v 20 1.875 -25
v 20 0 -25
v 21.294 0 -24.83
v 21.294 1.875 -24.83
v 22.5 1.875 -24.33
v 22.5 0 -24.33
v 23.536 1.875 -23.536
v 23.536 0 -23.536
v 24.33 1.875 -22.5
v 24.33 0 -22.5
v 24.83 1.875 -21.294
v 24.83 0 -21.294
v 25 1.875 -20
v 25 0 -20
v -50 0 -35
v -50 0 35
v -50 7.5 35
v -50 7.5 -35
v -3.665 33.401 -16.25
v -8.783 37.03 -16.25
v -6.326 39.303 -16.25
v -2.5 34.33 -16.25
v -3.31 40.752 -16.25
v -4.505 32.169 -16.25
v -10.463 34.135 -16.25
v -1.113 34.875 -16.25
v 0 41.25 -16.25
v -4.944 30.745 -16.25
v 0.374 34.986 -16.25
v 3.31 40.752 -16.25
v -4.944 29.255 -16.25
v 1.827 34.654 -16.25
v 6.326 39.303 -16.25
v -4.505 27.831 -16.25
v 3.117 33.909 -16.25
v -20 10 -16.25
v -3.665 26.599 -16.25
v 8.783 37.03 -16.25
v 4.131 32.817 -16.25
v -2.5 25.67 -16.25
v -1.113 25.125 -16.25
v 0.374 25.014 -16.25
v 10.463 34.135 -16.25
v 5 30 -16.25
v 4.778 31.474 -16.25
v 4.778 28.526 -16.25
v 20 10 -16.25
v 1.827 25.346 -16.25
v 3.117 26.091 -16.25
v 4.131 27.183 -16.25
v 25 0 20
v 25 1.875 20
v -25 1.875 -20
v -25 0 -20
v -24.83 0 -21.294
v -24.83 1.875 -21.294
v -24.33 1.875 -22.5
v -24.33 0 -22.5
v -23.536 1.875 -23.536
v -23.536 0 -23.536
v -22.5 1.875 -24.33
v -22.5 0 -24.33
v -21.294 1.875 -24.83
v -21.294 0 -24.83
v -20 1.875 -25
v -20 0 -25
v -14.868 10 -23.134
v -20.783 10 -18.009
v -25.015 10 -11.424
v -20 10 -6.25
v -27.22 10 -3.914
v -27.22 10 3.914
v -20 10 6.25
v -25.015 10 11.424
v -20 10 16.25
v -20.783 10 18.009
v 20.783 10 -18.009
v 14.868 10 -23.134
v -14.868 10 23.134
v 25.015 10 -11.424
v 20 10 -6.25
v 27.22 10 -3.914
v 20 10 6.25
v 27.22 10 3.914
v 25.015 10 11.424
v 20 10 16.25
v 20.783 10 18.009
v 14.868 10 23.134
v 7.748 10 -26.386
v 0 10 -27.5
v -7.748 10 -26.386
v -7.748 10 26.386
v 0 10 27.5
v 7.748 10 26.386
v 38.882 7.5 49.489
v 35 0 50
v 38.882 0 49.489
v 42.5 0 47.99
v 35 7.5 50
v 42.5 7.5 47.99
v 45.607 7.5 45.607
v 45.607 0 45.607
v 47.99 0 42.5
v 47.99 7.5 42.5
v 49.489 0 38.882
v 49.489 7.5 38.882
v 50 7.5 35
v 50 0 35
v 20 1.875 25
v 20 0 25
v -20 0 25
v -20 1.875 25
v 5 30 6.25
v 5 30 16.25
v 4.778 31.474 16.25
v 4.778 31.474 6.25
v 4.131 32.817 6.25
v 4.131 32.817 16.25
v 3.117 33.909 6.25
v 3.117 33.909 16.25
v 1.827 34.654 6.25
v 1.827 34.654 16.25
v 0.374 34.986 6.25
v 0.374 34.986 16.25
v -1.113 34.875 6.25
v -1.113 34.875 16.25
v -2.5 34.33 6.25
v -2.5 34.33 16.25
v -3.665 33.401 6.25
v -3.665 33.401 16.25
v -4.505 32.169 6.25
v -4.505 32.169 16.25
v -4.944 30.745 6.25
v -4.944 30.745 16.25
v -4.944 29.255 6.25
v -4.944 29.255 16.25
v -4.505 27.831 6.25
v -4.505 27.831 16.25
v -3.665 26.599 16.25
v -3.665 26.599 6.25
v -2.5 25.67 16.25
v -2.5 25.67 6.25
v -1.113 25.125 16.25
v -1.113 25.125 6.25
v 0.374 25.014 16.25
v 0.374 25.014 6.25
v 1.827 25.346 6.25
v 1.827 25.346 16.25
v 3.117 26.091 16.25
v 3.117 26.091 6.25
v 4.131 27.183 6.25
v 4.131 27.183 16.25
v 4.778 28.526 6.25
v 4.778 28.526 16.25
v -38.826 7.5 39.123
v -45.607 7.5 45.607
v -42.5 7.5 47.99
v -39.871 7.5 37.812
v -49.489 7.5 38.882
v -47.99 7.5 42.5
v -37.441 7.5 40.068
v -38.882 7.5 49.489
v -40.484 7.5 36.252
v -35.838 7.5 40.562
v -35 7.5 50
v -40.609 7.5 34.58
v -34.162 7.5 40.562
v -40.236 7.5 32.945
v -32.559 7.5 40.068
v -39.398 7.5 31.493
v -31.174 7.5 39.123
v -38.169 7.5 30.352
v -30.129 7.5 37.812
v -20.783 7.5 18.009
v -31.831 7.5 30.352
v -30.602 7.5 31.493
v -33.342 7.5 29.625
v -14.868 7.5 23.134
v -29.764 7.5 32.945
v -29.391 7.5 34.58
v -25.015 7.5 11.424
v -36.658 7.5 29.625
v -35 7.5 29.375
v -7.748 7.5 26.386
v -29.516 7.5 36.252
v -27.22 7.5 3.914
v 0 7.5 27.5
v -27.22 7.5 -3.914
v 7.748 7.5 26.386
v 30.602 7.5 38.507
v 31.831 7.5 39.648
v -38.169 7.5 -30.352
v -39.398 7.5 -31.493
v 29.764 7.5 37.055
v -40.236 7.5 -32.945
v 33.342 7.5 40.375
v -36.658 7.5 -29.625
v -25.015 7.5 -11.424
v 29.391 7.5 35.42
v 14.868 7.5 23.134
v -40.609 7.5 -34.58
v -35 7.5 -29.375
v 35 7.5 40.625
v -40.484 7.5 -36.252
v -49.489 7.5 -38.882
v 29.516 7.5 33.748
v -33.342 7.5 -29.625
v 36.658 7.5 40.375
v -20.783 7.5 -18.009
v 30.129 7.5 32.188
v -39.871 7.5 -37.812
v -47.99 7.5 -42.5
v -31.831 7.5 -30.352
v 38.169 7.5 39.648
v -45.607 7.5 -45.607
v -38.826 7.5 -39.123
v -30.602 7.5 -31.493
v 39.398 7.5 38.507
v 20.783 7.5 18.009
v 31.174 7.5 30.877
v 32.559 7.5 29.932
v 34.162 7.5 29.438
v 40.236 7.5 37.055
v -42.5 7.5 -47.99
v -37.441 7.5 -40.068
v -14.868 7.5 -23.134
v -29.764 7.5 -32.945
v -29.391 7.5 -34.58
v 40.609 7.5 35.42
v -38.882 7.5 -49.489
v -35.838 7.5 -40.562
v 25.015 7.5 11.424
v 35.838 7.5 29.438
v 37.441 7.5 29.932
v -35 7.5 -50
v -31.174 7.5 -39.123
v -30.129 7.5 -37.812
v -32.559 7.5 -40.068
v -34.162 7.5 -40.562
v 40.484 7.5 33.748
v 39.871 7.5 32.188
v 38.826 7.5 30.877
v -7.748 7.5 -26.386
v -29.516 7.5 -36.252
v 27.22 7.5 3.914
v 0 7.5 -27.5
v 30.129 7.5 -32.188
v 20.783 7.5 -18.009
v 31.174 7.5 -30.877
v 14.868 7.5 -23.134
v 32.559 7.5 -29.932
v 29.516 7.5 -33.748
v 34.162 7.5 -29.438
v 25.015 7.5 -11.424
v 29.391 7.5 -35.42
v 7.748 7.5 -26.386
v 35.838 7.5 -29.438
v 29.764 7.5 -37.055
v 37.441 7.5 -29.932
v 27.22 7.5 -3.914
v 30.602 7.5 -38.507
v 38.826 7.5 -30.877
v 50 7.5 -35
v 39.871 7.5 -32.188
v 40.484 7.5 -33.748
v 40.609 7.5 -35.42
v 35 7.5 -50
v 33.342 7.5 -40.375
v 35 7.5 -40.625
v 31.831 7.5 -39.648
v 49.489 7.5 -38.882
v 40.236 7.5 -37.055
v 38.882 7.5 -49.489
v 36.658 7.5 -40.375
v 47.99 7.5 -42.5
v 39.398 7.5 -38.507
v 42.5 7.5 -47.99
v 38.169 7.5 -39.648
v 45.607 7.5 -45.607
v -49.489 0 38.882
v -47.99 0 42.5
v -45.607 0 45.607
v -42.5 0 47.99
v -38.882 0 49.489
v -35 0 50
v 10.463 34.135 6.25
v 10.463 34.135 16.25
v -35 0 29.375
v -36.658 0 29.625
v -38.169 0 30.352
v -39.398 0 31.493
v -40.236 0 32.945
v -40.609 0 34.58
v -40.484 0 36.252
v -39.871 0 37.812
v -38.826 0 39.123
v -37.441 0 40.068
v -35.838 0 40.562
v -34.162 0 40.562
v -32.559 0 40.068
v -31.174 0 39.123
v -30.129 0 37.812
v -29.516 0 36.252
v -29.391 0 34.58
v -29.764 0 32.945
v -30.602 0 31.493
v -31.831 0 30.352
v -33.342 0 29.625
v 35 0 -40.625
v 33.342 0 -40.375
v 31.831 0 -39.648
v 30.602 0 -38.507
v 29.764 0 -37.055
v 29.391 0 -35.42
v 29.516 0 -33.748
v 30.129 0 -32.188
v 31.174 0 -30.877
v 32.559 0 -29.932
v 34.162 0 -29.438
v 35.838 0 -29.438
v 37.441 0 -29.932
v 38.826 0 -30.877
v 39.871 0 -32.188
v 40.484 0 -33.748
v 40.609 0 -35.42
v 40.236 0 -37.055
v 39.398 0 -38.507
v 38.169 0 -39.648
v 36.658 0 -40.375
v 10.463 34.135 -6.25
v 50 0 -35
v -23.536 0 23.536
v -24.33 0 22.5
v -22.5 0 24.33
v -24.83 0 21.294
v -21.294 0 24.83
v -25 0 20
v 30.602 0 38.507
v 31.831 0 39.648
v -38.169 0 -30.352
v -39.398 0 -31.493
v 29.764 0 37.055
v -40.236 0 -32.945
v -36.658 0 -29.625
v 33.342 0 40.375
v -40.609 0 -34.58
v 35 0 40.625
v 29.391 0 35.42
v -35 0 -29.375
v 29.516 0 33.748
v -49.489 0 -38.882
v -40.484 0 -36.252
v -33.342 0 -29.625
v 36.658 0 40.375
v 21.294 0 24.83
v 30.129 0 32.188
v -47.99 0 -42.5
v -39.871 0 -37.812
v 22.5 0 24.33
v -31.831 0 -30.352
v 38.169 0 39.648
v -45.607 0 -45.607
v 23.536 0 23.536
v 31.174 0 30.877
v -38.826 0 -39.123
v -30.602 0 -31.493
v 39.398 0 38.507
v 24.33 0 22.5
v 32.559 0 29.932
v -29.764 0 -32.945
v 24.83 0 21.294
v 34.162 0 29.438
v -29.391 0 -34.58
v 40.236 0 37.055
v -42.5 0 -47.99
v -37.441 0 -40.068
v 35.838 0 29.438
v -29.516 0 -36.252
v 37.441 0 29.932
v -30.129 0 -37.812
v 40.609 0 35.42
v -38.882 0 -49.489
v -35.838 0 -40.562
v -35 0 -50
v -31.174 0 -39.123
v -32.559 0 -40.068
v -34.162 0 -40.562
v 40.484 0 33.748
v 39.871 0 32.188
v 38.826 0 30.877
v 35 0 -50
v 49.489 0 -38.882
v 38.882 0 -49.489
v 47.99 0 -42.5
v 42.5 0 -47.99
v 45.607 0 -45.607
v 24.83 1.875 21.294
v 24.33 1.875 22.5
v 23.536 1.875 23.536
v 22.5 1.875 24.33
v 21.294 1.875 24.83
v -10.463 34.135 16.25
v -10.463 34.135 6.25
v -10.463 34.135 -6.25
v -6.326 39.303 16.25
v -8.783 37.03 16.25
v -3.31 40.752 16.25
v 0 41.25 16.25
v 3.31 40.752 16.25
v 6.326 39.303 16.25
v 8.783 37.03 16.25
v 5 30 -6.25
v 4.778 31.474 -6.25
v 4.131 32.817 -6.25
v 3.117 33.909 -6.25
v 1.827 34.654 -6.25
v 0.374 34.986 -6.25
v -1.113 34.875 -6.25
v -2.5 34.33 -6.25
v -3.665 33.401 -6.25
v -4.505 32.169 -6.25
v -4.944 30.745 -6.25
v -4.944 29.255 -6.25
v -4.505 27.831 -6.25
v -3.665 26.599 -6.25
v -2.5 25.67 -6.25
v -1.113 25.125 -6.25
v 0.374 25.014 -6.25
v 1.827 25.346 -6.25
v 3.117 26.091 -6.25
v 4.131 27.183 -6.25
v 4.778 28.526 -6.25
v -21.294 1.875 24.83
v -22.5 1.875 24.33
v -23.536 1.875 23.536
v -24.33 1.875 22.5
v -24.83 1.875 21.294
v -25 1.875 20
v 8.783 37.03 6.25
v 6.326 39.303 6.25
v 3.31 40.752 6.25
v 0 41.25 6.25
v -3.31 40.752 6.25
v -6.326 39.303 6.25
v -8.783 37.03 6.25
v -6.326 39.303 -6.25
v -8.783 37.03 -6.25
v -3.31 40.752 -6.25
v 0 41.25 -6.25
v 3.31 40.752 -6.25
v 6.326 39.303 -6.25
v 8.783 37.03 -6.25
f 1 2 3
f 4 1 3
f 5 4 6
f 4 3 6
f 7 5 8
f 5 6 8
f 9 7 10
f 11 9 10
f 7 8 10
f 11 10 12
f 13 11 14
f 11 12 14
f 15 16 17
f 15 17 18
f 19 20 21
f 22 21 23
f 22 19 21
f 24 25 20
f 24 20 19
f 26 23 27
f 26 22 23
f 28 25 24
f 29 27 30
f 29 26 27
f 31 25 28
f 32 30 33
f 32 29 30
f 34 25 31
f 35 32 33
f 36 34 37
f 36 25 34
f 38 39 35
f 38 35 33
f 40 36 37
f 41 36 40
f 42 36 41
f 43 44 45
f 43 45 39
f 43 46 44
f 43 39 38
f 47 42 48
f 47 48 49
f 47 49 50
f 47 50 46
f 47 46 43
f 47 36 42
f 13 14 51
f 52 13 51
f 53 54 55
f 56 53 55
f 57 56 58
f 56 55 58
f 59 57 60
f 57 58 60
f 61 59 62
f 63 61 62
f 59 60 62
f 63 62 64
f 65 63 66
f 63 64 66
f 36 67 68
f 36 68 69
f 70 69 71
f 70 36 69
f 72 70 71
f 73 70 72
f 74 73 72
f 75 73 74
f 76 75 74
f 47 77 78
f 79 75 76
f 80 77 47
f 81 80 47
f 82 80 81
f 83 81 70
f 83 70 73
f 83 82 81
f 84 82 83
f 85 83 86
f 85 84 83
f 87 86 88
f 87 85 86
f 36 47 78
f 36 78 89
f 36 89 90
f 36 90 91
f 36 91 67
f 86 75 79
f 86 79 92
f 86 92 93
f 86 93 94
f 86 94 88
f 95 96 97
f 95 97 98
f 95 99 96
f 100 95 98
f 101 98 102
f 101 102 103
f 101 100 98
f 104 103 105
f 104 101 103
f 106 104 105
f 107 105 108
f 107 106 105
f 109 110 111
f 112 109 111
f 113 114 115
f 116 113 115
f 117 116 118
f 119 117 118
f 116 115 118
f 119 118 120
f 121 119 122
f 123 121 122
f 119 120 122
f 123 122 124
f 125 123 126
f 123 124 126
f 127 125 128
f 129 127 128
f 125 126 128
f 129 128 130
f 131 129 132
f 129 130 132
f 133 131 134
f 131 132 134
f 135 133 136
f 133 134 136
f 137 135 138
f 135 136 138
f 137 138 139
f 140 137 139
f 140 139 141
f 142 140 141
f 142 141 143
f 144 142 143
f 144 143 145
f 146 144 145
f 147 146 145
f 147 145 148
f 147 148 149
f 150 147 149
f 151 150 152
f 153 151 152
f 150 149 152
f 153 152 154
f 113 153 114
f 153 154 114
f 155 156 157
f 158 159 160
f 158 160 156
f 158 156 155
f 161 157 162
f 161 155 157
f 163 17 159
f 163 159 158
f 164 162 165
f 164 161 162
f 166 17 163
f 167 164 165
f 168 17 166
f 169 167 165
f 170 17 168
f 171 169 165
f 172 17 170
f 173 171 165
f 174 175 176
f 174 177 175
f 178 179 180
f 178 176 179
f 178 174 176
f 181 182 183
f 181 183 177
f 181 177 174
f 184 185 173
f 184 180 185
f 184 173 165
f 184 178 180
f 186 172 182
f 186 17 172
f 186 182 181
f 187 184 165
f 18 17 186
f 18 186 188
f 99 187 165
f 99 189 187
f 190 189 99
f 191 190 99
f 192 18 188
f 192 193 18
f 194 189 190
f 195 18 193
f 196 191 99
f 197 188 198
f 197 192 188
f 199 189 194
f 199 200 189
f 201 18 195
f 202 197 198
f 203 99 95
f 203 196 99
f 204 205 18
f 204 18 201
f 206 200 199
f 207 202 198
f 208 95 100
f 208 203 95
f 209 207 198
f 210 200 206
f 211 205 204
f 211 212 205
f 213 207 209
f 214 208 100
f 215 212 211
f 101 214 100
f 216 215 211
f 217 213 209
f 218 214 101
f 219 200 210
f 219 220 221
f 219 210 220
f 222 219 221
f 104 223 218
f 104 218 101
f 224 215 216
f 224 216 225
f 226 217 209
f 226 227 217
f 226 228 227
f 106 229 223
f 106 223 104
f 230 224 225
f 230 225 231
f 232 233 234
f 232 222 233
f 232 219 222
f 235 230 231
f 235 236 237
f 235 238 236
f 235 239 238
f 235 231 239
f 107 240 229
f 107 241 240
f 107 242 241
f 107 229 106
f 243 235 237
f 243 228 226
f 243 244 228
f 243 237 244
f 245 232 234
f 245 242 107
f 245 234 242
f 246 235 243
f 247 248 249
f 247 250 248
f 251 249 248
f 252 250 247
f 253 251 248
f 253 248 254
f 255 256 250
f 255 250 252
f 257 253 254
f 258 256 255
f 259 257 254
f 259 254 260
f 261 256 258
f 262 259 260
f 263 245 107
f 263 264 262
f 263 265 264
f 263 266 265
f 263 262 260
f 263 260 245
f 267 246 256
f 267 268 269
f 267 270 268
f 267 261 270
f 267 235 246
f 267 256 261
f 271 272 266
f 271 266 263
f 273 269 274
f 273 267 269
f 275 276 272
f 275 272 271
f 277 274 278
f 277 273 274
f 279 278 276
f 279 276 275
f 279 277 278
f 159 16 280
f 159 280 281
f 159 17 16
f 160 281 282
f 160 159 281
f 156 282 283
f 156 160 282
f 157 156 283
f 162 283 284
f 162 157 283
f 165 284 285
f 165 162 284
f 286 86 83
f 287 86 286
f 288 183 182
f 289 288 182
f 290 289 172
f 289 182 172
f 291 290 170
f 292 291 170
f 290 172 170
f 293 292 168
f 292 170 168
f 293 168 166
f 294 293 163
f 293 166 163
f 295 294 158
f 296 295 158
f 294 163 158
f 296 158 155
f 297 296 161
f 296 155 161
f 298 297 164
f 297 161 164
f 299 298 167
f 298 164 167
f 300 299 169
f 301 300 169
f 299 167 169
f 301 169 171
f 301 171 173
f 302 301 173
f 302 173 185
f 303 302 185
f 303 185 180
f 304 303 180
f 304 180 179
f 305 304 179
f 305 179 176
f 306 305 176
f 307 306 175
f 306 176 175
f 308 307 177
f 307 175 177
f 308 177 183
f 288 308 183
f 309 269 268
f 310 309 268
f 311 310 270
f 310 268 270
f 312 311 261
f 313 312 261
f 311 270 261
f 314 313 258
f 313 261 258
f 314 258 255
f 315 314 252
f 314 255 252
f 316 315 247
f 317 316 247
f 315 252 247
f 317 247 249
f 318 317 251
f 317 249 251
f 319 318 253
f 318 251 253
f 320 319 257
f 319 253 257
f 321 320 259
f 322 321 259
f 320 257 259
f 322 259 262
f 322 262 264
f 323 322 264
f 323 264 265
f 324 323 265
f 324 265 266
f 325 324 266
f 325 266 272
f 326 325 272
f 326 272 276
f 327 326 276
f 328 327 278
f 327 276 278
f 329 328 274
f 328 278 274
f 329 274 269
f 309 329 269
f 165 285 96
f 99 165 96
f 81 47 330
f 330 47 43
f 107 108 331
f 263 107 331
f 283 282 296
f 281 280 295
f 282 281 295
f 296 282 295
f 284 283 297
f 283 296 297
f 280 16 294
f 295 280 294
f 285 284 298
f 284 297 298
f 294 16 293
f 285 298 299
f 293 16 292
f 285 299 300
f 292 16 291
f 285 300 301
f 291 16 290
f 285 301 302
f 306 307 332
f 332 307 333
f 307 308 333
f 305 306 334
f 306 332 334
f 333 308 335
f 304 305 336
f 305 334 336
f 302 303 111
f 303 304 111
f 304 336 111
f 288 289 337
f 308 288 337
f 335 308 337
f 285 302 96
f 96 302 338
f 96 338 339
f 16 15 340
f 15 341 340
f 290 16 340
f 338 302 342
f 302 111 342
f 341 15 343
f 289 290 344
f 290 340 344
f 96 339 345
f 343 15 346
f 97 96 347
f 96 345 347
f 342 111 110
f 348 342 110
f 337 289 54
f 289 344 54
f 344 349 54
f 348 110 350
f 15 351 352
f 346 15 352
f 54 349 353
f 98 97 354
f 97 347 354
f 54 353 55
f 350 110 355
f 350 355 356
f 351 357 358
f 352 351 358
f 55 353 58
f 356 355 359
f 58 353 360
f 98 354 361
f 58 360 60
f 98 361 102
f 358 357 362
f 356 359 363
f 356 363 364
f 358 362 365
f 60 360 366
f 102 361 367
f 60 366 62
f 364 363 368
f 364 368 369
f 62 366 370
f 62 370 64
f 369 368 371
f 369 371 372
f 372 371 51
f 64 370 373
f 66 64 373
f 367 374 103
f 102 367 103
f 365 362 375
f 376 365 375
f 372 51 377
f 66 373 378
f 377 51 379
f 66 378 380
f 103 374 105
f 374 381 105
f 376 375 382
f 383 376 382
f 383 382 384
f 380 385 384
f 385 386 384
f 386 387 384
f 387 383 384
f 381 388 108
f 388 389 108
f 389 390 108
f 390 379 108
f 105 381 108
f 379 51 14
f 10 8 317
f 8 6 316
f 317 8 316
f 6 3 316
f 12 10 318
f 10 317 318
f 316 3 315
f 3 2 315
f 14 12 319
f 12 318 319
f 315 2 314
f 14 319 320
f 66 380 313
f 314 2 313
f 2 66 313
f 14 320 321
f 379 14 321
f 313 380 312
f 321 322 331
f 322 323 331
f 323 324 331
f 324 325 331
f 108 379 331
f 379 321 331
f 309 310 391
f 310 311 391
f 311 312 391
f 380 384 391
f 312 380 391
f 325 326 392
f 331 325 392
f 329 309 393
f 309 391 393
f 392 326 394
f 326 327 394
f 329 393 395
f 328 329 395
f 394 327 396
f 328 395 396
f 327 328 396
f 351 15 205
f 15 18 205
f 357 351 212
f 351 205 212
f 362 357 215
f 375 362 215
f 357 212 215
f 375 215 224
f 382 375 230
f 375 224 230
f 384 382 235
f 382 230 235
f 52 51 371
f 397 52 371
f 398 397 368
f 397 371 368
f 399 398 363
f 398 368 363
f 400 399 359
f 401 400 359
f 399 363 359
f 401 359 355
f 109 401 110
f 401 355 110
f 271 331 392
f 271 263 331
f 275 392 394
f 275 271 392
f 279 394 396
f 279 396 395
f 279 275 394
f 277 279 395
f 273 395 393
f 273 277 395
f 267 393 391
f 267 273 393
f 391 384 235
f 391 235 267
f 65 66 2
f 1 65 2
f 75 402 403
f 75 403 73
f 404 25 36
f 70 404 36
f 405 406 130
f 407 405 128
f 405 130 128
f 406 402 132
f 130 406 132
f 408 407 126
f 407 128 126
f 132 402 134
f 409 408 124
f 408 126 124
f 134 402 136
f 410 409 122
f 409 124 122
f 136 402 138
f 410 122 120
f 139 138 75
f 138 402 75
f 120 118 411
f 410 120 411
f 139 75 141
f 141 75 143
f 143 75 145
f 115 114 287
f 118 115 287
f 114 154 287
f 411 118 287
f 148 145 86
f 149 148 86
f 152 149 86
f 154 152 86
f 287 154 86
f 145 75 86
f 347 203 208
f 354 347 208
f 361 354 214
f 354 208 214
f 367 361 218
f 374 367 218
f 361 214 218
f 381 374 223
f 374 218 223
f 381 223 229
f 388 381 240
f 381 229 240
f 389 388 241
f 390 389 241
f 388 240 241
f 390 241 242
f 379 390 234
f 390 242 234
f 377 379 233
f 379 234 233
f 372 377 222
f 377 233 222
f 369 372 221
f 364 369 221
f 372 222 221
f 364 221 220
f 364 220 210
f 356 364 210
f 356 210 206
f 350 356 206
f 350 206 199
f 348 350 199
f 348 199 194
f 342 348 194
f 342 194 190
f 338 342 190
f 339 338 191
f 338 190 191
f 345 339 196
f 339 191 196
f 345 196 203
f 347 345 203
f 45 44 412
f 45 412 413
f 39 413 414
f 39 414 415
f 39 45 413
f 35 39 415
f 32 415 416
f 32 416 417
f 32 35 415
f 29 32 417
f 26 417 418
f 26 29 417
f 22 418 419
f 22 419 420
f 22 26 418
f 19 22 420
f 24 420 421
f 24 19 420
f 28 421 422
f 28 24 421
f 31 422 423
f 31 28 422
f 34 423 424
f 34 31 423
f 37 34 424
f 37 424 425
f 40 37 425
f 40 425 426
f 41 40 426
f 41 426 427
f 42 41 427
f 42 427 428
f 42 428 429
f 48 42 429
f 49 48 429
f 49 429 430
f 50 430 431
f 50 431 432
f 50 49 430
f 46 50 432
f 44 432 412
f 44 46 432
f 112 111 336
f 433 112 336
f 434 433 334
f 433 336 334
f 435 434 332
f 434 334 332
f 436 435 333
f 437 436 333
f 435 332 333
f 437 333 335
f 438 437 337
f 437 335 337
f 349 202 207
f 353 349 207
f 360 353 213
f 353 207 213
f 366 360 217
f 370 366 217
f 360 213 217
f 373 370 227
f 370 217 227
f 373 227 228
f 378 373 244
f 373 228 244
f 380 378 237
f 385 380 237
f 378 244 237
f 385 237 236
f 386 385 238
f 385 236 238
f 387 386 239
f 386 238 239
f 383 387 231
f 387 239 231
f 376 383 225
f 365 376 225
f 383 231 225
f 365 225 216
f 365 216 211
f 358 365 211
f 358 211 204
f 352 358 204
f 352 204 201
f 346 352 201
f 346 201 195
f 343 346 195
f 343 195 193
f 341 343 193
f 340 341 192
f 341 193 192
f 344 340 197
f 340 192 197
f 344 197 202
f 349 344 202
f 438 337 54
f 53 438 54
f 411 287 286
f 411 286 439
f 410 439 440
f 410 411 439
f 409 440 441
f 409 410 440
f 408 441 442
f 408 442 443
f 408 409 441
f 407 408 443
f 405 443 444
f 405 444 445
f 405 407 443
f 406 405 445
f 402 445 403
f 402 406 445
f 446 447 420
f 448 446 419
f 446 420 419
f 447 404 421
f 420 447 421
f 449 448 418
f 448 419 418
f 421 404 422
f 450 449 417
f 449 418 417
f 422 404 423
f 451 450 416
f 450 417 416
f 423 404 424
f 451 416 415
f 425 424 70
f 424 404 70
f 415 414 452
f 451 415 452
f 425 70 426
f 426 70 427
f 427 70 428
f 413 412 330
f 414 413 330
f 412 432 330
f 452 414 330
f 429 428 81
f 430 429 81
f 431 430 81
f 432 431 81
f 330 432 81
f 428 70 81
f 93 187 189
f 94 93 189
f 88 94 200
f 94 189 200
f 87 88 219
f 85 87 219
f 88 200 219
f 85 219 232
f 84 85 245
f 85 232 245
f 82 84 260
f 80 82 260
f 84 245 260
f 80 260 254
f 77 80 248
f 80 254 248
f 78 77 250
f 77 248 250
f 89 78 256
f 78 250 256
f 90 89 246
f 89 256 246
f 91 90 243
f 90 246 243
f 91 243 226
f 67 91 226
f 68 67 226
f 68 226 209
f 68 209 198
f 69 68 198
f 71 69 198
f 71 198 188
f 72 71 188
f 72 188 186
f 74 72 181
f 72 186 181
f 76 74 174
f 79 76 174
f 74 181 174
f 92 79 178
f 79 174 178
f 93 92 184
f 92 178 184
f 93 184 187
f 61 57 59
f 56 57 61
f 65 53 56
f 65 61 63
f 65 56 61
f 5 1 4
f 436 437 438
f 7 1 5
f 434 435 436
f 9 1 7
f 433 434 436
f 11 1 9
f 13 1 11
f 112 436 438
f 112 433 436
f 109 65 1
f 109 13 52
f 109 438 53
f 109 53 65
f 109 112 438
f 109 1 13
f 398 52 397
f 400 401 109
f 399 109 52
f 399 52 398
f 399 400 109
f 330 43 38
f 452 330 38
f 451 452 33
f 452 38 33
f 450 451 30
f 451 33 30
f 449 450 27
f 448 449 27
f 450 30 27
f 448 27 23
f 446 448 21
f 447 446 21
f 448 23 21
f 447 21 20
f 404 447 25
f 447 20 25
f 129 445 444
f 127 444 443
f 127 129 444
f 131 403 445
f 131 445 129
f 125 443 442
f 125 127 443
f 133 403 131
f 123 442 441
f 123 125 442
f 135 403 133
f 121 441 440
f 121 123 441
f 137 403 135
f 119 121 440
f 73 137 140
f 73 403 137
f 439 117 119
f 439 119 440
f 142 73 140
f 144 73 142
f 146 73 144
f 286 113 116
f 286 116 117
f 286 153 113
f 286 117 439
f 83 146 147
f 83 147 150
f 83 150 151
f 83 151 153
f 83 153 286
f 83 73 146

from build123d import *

# Parameters (mm, degrees)
SKETCH1_W           = 100
SKETCH1_H           = 100
BOSS_EXTRUDE1_DEPTH = 7.5
FILLET1_R           = 15
SKETCH2_R           = 5.625
CUT_EXTRUDE1_DEPTH  = 7.5
SKETCH3_R           = 27.5
BOSS_EXTRUDE2_DEPTH = 2.5
SKETCH5_W           = 40
SKETCH5_H           = 10
BOSS_EXTRUDE4_DEPTH = 40
SKETCH6_R           = 5
CUT_EXTRUDE2_DEPTH  = 10
CUT_EXTRUDE3_DEPTH  = 1.875


with BuildPart() as part:
    # Sketch1 → Boss-Extrude1 (new body)
    with BuildSketch(Plane(origin=(0, 0, 0), x_dir=(1, 0, 0), z_dir=(0, 1, 0))):
        Rectangle(SKETCH1_W, SKETCH1_H)
    extrude(amount=BOSS_EXTRUDE1_DEPTH)

    # Fillet1
    fillet1_edges = [part.edges().sort_by_distance(p)[0] for p in [
        (50, 3.75, 50),
        (-50, 3.75, 50),
        (-50, 3.75, -50),
        (50, 3.75, -50),
    ]]
    fillet(fillet1_edges, radius=FILLET1_R)

    # Sketch2 → Cut-Extrude1 (cut)
    with BuildSketch(Plane(origin=(0, 7.5, 0), x_dir=(1, 0, 0), z_dir=(0, 1, 0))):
        with Locations(Location((-35, 35, 0), (0, 0, 270))):
            Circle(SKETCH2_R)
        with Locations(Location((35, 35, 0), (0, 0, 90))):
            Circle(SKETCH2_R)
        with Locations(Location((35, -35, 0), (0, 0, 270))):
            Circle(SKETCH2_R)
        with Locations(Location((-35, -35, 0), (0, 0, 90))):
            Circle(SKETCH2_R)
    extrude(amount=-CUT_EXTRUDE1_DEPTH, mode=Mode.SUBTRACT)

    # Sketch3 → Boss-Extrude2 (add)
    with BuildSketch(Plane(origin=(0, 7.5, 0), x_dir=(1, 0, 0), z_dir=(0, 1, 0))):
        with Locations(Location((0, 0, 0), (0, 0, 270))):
            Circle(SKETCH3_R)
    extrude(amount=BOSS_EXTRUDE2_DEPTH)

    # Sketch5 → Boss-Extrude4 (add)
    with BuildSketch(Plane(origin=(0, 10, 0), x_dir=(1, 0, 0), z_dir=(0, 1, 0))):
        with Locations((0, -11.25)):
            Rectangle(SKETCH5_W, SKETCH5_H)
    boss_extrude4 = extrude(amount=BOSS_EXTRUDE4_DEPTH)

    # Sketch6 → Cut-Extrude2 (cut)
    with BuildSketch(Plane.XY.offset(16.25)):
        with BuildLine():
            ThreePointArc((10.462689665, 34.134564665), (0, 41.25), (-10.462689665, 34.134564665))
            Line((-10.462689665, 34.134564665), (-20, 10))
            Line((-20, 10), (-20, 50))
            Line((-20, 50), (20, 50))
            Line((20, 50), (20, 10))
            Line((20, 10), (10.462689665, 34.134564665))
        make_face()
        with Locations((0, 30)):
            Circle(SKETCH6_R)
    cut_extrude2 = extrude(amount=-CUT_EXTRUDE2_DEPTH, mode=Mode.SUBTRACT)

    # Mirror4: Boss-Extrude4, Cut-Extrude2 across plane
    add(boss_extrude4.mirror(Plane.XY))
    add(cut_extrude2.mirror(Plane.XY), mode=Mode.SUBTRACT)

    # Sketch7 → Cut-Extrude3 (cut)
    with BuildSketch(Plane.XZ):
        with BuildLine():
            Line((-20, -25), (20, -25))
            ThreePointArc((20, -25), (23.535533906, -23.535533906), (25, -20))
            Line((25, -20), (25, 20))
            ThreePointArc((25, 20), (23.535533906, 23.535533906), (20, 25))
            Line((20, 25), (-20, 25))
            ThreePointArc((-20, 25), (-23.535533906, 23.535533906), (-25, 20))
            Line((-25, 20), (-25, -20))
            ThreePointArc((-25, -20), (-23.535533906, -23.535533906), (-20, -25))
        make_face()
    extrude(amount=-CUT_EXTRUDE3_DEPTH, mode=Mode.SUBTRACT)


solid = part.part
